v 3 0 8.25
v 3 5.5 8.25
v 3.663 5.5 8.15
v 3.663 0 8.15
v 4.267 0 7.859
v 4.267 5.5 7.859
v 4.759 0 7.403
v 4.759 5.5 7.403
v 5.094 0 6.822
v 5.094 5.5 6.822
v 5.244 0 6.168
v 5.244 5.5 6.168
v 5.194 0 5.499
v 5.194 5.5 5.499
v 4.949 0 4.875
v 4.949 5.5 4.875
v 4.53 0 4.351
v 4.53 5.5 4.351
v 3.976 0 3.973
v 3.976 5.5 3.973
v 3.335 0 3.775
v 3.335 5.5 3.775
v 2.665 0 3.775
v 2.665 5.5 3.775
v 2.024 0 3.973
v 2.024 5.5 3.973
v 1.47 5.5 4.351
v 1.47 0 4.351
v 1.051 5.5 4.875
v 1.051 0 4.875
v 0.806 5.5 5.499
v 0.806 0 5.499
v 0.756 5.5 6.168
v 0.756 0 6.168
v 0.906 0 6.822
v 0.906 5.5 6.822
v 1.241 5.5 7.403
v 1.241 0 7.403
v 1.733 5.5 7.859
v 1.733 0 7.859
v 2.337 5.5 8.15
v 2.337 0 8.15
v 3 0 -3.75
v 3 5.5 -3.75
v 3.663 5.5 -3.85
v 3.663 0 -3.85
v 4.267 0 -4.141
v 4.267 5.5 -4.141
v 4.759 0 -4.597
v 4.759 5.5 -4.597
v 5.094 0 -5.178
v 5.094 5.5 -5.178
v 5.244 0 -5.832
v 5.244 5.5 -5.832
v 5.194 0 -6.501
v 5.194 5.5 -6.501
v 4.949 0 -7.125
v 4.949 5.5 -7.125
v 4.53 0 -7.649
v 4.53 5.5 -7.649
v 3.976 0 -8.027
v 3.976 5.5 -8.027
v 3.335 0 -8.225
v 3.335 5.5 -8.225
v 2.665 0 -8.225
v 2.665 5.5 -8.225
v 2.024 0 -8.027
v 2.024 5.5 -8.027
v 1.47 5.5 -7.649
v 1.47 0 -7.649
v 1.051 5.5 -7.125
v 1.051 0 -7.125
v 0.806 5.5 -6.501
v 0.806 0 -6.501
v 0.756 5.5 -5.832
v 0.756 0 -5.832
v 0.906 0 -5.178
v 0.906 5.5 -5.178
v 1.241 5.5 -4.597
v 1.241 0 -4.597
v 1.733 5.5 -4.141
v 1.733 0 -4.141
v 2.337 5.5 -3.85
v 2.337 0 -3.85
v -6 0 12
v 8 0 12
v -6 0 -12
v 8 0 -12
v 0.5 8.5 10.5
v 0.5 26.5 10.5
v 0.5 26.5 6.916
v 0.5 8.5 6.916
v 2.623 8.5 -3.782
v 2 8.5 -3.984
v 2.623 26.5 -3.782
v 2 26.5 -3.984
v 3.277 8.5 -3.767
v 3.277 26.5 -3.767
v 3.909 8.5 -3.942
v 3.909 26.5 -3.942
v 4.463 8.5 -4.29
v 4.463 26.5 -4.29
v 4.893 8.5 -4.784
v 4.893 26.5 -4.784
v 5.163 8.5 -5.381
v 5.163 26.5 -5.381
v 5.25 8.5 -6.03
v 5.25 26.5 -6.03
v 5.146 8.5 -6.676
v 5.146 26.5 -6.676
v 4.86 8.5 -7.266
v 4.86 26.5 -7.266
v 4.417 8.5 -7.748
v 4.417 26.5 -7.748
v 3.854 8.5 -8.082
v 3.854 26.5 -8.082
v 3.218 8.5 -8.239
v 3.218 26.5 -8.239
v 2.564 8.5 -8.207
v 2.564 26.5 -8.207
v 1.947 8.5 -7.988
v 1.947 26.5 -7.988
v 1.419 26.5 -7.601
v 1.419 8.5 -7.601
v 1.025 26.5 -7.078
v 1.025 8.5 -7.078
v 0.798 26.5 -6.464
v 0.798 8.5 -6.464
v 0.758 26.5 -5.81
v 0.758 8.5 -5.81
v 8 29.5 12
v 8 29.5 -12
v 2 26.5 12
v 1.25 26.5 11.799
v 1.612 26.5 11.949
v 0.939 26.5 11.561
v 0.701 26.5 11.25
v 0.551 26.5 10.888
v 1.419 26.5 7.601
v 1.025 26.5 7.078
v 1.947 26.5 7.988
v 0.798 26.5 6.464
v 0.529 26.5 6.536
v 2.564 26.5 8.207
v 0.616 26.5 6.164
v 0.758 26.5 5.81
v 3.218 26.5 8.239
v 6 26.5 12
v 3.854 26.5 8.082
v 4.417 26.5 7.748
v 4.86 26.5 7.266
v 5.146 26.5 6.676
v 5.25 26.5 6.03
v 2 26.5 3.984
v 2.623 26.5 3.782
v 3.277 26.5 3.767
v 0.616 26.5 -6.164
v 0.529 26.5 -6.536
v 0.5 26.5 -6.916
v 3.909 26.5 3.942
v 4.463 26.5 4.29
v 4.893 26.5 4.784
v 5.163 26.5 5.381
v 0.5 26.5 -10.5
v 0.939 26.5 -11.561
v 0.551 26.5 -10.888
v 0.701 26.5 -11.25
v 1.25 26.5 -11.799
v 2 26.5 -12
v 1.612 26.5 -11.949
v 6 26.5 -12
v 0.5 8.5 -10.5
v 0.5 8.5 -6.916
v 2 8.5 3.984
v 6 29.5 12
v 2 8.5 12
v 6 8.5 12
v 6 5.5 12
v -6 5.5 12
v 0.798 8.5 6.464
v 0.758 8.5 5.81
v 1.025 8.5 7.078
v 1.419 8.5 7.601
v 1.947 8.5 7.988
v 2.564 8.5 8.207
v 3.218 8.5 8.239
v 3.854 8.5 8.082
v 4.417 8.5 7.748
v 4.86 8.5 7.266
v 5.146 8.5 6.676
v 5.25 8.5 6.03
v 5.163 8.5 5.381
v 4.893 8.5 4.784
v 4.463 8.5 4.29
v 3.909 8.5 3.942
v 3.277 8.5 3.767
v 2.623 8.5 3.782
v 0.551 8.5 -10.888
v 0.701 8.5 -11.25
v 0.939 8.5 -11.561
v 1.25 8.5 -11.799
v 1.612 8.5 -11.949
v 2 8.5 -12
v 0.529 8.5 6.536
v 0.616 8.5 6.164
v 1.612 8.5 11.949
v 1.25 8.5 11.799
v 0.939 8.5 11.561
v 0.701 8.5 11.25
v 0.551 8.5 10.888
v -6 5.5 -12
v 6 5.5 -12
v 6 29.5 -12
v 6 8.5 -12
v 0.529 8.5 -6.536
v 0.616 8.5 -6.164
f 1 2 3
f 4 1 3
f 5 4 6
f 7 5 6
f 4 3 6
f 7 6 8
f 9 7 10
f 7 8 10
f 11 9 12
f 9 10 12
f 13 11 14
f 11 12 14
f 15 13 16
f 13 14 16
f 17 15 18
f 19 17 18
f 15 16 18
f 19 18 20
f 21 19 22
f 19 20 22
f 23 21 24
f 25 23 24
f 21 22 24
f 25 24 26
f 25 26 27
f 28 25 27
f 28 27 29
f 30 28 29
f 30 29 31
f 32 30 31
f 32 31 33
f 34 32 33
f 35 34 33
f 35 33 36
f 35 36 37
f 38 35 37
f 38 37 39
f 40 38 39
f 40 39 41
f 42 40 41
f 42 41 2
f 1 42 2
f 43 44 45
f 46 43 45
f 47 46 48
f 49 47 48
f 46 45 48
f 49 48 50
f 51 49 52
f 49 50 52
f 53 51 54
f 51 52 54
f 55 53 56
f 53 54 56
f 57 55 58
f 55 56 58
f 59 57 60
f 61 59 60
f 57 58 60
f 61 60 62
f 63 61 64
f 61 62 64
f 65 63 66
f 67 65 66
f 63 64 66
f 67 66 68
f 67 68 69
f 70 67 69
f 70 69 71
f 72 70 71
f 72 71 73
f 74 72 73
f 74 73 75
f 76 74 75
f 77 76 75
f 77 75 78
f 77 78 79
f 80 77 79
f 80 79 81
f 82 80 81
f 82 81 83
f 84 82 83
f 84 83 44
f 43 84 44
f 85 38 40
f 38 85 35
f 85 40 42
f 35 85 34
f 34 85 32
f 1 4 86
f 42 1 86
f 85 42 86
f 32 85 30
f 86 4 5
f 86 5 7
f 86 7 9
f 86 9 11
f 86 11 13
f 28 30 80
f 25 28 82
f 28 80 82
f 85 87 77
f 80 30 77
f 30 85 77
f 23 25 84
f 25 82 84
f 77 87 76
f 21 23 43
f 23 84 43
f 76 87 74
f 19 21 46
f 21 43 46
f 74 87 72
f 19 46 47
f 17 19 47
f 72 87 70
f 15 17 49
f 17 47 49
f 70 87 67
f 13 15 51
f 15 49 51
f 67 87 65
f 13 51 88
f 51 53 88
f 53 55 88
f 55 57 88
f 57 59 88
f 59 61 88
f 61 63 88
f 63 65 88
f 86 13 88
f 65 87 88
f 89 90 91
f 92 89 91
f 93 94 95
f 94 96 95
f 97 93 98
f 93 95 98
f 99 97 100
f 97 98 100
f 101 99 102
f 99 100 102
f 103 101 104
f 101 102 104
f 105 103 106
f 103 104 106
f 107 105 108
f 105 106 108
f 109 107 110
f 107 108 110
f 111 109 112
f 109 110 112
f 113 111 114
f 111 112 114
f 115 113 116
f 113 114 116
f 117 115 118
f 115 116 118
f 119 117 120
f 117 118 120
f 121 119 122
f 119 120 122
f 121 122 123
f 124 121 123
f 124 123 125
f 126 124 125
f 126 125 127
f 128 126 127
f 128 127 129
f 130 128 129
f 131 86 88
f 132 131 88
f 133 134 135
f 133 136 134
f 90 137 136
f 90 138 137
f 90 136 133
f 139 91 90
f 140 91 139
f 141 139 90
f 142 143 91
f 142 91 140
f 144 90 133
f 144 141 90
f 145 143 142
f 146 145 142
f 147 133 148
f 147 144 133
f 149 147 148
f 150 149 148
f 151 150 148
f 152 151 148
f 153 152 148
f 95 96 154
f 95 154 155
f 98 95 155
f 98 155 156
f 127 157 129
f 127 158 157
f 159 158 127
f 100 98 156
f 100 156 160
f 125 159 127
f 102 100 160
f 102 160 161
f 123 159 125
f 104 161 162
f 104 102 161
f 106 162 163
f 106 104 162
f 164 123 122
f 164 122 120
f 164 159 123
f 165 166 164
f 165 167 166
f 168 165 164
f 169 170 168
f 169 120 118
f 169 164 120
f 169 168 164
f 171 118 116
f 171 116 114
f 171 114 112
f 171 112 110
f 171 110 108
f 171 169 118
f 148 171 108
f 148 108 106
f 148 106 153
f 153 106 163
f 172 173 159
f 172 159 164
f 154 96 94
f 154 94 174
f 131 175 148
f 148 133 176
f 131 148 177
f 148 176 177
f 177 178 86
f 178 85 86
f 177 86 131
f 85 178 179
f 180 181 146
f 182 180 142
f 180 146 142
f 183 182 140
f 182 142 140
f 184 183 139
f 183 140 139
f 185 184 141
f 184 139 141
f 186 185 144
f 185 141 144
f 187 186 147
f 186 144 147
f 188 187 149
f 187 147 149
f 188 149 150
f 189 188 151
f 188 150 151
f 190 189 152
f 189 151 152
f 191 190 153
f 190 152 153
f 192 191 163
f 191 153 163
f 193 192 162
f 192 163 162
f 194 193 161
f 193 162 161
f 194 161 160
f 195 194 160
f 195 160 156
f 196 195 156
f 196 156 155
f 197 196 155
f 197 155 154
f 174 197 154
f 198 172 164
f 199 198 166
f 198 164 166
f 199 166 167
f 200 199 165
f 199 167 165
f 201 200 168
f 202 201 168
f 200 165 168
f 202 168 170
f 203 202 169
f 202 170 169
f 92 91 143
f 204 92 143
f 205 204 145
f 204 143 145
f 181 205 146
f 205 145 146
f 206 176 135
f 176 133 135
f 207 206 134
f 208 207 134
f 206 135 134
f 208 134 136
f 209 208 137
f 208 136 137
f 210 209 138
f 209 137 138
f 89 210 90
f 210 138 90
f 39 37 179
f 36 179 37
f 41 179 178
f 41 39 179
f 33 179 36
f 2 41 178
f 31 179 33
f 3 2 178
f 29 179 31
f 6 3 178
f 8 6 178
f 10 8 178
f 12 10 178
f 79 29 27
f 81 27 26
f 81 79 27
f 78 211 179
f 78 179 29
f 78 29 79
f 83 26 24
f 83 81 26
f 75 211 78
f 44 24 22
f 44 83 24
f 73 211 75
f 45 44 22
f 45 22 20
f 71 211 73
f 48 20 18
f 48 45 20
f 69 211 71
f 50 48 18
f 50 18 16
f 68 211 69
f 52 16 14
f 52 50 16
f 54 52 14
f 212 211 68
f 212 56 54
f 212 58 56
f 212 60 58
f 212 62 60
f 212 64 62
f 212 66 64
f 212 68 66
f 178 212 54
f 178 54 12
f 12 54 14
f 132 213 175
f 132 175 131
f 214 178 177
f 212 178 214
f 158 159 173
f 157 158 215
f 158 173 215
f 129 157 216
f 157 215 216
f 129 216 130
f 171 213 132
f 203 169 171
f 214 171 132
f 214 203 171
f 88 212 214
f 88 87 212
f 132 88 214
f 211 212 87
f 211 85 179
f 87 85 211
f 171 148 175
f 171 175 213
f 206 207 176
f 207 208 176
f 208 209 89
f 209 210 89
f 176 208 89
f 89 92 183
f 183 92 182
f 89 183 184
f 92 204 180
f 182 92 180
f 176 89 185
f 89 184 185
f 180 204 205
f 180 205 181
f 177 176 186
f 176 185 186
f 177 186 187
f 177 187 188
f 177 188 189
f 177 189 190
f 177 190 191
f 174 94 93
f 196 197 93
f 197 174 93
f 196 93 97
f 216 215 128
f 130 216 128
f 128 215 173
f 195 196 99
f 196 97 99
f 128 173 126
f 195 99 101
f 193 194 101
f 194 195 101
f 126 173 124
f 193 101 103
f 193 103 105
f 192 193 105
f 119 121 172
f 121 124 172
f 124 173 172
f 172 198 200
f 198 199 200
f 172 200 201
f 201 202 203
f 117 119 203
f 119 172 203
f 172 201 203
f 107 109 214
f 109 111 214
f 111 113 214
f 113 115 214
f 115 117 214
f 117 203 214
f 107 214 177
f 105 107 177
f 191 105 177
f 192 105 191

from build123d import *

# Parameters (mm, degrees)
SKETCH1_W           = 12
SKETCH1_H           = 24
BOSS_EXTRUDE1_DEPTH = 5.5
SKETCH2_W           = 2
SKETCH2_H           = 24
BOSS_EXTRUDE2_DEPTH = 29.5
BOSS_EXTRUDE4_START = 3
SKETCH4_W           = 5.5
SKETCH4_H           = 24
BOSS_EXTRUDE4_DEPTH = 18
SKETCH5_W           = 9.25
SKETCH5_H           = 18
CUT_EXTRUDE1_DEPTH  = 1.5
FILLET1_R           = 2.5
SKETCH6_R           = 2.25
CUT_EXTRUDE2_DEPTH  = 31.170349683
FILLET2_R           = 1.5


with BuildPart() as part:
    # Sketch1 → Boss-Extrude1 (new body)
    with BuildSketch(Plane(origin=(0, 0, 0), x_dir=(1, 0, 0), z_dir=(0, 1, 0))):
        Rectangle(SKETCH1_W, SKETCH1_H)
    extrude(amount=BOSS_EXTRUDE1_DEPTH)

    # Sketch2 → Boss-Extrude2 (add)
    with BuildSketch(Plane(origin=(0, 0, 0), x_dir=(1, 0, 0), z_dir=(0, 1, 0))):
        with Locations((7, 0)):
            Rectangle(SKETCH2_W, SKETCH2_H)
    extrude(amount=BOSS_EXTRUDE2_DEPTH)

    # Sketch4 → Boss-Extrude4 (add)
    with BuildSketch(Plane(origin=(0, 5.5, 0), x_dir=(1, 0, 0), z_dir=(0, 1, 0)).offset(BOSS_EXTRUDE4_START)):
        with Locations((3.25, 0)):
            Rectangle(SKETCH4_W, SKETCH4_H)
    extrude(amount=BOSS_EXTRUDE4_DEPTH)

    # Sketch5 → Cut-Extrude1 (cut)
    with BuildSketch(Plane.ZY.offset(-0.5)):
        with Locations((0, 17.5)):
            Rectangle(SKETCH5_W, SKETCH5_H)
    extrude(amount=-CUT_EXTRUDE1_DEPTH, mode=Mode.SUBTRACT)

    # Fillet1
    # the kernel refuses this fillet: 2.5 mm, written as the material it takes off along each edge
    with BuildSketch(Plane(origin=(0.5, 32.228219619, 4.625), x_dir=(0, 0, 1), z_dir=(0, -1, 0)), Plane(origin=(0.5, 8.5, -4.625), x_dir=(0, 0, -1), z_dir=(0, 1, 0))) as fillet1_piece_1:
        with BuildLine():
            CenterArc((2.291287847, -2.5), FILLET1_R, 90, 66.421821522)
            Line((0, -1.5), (0, 0))
            Line((0, 0), (2.291287847, 0))
        make_face()
    extrude(amount=23.728219619, mode=Mode.SUBTRACT)

    # Sketch6 → Cut-Extrude2 (cut, through all)
    with BuildSketch(Plane(origin=(0, 26.5, 0), x_dir=(1, 0, 0), z_dir=(0, 1, 0))):
        with Locations(Location((3, -6, 0), (0, 0, 270))):
            Circle(SKETCH6_R)
        with Locations(Location((3, 6, 0), (0, 0, 270))):
            Circle(SKETCH6_R)
    extrude(amount=-CUT_EXTRUDE2_DEPTH, mode=Mode.SUBTRACT)

    # Fillet2
    fillet2_edges = [part.edges().sort_by_distance(p)[0] for p in [
        (0.5, 17.5, -12),
        (0.5, 17.5, 12),
    ]]
    fillet(fillet2_edges, radius=FILLET2_R)


solid = part.part
